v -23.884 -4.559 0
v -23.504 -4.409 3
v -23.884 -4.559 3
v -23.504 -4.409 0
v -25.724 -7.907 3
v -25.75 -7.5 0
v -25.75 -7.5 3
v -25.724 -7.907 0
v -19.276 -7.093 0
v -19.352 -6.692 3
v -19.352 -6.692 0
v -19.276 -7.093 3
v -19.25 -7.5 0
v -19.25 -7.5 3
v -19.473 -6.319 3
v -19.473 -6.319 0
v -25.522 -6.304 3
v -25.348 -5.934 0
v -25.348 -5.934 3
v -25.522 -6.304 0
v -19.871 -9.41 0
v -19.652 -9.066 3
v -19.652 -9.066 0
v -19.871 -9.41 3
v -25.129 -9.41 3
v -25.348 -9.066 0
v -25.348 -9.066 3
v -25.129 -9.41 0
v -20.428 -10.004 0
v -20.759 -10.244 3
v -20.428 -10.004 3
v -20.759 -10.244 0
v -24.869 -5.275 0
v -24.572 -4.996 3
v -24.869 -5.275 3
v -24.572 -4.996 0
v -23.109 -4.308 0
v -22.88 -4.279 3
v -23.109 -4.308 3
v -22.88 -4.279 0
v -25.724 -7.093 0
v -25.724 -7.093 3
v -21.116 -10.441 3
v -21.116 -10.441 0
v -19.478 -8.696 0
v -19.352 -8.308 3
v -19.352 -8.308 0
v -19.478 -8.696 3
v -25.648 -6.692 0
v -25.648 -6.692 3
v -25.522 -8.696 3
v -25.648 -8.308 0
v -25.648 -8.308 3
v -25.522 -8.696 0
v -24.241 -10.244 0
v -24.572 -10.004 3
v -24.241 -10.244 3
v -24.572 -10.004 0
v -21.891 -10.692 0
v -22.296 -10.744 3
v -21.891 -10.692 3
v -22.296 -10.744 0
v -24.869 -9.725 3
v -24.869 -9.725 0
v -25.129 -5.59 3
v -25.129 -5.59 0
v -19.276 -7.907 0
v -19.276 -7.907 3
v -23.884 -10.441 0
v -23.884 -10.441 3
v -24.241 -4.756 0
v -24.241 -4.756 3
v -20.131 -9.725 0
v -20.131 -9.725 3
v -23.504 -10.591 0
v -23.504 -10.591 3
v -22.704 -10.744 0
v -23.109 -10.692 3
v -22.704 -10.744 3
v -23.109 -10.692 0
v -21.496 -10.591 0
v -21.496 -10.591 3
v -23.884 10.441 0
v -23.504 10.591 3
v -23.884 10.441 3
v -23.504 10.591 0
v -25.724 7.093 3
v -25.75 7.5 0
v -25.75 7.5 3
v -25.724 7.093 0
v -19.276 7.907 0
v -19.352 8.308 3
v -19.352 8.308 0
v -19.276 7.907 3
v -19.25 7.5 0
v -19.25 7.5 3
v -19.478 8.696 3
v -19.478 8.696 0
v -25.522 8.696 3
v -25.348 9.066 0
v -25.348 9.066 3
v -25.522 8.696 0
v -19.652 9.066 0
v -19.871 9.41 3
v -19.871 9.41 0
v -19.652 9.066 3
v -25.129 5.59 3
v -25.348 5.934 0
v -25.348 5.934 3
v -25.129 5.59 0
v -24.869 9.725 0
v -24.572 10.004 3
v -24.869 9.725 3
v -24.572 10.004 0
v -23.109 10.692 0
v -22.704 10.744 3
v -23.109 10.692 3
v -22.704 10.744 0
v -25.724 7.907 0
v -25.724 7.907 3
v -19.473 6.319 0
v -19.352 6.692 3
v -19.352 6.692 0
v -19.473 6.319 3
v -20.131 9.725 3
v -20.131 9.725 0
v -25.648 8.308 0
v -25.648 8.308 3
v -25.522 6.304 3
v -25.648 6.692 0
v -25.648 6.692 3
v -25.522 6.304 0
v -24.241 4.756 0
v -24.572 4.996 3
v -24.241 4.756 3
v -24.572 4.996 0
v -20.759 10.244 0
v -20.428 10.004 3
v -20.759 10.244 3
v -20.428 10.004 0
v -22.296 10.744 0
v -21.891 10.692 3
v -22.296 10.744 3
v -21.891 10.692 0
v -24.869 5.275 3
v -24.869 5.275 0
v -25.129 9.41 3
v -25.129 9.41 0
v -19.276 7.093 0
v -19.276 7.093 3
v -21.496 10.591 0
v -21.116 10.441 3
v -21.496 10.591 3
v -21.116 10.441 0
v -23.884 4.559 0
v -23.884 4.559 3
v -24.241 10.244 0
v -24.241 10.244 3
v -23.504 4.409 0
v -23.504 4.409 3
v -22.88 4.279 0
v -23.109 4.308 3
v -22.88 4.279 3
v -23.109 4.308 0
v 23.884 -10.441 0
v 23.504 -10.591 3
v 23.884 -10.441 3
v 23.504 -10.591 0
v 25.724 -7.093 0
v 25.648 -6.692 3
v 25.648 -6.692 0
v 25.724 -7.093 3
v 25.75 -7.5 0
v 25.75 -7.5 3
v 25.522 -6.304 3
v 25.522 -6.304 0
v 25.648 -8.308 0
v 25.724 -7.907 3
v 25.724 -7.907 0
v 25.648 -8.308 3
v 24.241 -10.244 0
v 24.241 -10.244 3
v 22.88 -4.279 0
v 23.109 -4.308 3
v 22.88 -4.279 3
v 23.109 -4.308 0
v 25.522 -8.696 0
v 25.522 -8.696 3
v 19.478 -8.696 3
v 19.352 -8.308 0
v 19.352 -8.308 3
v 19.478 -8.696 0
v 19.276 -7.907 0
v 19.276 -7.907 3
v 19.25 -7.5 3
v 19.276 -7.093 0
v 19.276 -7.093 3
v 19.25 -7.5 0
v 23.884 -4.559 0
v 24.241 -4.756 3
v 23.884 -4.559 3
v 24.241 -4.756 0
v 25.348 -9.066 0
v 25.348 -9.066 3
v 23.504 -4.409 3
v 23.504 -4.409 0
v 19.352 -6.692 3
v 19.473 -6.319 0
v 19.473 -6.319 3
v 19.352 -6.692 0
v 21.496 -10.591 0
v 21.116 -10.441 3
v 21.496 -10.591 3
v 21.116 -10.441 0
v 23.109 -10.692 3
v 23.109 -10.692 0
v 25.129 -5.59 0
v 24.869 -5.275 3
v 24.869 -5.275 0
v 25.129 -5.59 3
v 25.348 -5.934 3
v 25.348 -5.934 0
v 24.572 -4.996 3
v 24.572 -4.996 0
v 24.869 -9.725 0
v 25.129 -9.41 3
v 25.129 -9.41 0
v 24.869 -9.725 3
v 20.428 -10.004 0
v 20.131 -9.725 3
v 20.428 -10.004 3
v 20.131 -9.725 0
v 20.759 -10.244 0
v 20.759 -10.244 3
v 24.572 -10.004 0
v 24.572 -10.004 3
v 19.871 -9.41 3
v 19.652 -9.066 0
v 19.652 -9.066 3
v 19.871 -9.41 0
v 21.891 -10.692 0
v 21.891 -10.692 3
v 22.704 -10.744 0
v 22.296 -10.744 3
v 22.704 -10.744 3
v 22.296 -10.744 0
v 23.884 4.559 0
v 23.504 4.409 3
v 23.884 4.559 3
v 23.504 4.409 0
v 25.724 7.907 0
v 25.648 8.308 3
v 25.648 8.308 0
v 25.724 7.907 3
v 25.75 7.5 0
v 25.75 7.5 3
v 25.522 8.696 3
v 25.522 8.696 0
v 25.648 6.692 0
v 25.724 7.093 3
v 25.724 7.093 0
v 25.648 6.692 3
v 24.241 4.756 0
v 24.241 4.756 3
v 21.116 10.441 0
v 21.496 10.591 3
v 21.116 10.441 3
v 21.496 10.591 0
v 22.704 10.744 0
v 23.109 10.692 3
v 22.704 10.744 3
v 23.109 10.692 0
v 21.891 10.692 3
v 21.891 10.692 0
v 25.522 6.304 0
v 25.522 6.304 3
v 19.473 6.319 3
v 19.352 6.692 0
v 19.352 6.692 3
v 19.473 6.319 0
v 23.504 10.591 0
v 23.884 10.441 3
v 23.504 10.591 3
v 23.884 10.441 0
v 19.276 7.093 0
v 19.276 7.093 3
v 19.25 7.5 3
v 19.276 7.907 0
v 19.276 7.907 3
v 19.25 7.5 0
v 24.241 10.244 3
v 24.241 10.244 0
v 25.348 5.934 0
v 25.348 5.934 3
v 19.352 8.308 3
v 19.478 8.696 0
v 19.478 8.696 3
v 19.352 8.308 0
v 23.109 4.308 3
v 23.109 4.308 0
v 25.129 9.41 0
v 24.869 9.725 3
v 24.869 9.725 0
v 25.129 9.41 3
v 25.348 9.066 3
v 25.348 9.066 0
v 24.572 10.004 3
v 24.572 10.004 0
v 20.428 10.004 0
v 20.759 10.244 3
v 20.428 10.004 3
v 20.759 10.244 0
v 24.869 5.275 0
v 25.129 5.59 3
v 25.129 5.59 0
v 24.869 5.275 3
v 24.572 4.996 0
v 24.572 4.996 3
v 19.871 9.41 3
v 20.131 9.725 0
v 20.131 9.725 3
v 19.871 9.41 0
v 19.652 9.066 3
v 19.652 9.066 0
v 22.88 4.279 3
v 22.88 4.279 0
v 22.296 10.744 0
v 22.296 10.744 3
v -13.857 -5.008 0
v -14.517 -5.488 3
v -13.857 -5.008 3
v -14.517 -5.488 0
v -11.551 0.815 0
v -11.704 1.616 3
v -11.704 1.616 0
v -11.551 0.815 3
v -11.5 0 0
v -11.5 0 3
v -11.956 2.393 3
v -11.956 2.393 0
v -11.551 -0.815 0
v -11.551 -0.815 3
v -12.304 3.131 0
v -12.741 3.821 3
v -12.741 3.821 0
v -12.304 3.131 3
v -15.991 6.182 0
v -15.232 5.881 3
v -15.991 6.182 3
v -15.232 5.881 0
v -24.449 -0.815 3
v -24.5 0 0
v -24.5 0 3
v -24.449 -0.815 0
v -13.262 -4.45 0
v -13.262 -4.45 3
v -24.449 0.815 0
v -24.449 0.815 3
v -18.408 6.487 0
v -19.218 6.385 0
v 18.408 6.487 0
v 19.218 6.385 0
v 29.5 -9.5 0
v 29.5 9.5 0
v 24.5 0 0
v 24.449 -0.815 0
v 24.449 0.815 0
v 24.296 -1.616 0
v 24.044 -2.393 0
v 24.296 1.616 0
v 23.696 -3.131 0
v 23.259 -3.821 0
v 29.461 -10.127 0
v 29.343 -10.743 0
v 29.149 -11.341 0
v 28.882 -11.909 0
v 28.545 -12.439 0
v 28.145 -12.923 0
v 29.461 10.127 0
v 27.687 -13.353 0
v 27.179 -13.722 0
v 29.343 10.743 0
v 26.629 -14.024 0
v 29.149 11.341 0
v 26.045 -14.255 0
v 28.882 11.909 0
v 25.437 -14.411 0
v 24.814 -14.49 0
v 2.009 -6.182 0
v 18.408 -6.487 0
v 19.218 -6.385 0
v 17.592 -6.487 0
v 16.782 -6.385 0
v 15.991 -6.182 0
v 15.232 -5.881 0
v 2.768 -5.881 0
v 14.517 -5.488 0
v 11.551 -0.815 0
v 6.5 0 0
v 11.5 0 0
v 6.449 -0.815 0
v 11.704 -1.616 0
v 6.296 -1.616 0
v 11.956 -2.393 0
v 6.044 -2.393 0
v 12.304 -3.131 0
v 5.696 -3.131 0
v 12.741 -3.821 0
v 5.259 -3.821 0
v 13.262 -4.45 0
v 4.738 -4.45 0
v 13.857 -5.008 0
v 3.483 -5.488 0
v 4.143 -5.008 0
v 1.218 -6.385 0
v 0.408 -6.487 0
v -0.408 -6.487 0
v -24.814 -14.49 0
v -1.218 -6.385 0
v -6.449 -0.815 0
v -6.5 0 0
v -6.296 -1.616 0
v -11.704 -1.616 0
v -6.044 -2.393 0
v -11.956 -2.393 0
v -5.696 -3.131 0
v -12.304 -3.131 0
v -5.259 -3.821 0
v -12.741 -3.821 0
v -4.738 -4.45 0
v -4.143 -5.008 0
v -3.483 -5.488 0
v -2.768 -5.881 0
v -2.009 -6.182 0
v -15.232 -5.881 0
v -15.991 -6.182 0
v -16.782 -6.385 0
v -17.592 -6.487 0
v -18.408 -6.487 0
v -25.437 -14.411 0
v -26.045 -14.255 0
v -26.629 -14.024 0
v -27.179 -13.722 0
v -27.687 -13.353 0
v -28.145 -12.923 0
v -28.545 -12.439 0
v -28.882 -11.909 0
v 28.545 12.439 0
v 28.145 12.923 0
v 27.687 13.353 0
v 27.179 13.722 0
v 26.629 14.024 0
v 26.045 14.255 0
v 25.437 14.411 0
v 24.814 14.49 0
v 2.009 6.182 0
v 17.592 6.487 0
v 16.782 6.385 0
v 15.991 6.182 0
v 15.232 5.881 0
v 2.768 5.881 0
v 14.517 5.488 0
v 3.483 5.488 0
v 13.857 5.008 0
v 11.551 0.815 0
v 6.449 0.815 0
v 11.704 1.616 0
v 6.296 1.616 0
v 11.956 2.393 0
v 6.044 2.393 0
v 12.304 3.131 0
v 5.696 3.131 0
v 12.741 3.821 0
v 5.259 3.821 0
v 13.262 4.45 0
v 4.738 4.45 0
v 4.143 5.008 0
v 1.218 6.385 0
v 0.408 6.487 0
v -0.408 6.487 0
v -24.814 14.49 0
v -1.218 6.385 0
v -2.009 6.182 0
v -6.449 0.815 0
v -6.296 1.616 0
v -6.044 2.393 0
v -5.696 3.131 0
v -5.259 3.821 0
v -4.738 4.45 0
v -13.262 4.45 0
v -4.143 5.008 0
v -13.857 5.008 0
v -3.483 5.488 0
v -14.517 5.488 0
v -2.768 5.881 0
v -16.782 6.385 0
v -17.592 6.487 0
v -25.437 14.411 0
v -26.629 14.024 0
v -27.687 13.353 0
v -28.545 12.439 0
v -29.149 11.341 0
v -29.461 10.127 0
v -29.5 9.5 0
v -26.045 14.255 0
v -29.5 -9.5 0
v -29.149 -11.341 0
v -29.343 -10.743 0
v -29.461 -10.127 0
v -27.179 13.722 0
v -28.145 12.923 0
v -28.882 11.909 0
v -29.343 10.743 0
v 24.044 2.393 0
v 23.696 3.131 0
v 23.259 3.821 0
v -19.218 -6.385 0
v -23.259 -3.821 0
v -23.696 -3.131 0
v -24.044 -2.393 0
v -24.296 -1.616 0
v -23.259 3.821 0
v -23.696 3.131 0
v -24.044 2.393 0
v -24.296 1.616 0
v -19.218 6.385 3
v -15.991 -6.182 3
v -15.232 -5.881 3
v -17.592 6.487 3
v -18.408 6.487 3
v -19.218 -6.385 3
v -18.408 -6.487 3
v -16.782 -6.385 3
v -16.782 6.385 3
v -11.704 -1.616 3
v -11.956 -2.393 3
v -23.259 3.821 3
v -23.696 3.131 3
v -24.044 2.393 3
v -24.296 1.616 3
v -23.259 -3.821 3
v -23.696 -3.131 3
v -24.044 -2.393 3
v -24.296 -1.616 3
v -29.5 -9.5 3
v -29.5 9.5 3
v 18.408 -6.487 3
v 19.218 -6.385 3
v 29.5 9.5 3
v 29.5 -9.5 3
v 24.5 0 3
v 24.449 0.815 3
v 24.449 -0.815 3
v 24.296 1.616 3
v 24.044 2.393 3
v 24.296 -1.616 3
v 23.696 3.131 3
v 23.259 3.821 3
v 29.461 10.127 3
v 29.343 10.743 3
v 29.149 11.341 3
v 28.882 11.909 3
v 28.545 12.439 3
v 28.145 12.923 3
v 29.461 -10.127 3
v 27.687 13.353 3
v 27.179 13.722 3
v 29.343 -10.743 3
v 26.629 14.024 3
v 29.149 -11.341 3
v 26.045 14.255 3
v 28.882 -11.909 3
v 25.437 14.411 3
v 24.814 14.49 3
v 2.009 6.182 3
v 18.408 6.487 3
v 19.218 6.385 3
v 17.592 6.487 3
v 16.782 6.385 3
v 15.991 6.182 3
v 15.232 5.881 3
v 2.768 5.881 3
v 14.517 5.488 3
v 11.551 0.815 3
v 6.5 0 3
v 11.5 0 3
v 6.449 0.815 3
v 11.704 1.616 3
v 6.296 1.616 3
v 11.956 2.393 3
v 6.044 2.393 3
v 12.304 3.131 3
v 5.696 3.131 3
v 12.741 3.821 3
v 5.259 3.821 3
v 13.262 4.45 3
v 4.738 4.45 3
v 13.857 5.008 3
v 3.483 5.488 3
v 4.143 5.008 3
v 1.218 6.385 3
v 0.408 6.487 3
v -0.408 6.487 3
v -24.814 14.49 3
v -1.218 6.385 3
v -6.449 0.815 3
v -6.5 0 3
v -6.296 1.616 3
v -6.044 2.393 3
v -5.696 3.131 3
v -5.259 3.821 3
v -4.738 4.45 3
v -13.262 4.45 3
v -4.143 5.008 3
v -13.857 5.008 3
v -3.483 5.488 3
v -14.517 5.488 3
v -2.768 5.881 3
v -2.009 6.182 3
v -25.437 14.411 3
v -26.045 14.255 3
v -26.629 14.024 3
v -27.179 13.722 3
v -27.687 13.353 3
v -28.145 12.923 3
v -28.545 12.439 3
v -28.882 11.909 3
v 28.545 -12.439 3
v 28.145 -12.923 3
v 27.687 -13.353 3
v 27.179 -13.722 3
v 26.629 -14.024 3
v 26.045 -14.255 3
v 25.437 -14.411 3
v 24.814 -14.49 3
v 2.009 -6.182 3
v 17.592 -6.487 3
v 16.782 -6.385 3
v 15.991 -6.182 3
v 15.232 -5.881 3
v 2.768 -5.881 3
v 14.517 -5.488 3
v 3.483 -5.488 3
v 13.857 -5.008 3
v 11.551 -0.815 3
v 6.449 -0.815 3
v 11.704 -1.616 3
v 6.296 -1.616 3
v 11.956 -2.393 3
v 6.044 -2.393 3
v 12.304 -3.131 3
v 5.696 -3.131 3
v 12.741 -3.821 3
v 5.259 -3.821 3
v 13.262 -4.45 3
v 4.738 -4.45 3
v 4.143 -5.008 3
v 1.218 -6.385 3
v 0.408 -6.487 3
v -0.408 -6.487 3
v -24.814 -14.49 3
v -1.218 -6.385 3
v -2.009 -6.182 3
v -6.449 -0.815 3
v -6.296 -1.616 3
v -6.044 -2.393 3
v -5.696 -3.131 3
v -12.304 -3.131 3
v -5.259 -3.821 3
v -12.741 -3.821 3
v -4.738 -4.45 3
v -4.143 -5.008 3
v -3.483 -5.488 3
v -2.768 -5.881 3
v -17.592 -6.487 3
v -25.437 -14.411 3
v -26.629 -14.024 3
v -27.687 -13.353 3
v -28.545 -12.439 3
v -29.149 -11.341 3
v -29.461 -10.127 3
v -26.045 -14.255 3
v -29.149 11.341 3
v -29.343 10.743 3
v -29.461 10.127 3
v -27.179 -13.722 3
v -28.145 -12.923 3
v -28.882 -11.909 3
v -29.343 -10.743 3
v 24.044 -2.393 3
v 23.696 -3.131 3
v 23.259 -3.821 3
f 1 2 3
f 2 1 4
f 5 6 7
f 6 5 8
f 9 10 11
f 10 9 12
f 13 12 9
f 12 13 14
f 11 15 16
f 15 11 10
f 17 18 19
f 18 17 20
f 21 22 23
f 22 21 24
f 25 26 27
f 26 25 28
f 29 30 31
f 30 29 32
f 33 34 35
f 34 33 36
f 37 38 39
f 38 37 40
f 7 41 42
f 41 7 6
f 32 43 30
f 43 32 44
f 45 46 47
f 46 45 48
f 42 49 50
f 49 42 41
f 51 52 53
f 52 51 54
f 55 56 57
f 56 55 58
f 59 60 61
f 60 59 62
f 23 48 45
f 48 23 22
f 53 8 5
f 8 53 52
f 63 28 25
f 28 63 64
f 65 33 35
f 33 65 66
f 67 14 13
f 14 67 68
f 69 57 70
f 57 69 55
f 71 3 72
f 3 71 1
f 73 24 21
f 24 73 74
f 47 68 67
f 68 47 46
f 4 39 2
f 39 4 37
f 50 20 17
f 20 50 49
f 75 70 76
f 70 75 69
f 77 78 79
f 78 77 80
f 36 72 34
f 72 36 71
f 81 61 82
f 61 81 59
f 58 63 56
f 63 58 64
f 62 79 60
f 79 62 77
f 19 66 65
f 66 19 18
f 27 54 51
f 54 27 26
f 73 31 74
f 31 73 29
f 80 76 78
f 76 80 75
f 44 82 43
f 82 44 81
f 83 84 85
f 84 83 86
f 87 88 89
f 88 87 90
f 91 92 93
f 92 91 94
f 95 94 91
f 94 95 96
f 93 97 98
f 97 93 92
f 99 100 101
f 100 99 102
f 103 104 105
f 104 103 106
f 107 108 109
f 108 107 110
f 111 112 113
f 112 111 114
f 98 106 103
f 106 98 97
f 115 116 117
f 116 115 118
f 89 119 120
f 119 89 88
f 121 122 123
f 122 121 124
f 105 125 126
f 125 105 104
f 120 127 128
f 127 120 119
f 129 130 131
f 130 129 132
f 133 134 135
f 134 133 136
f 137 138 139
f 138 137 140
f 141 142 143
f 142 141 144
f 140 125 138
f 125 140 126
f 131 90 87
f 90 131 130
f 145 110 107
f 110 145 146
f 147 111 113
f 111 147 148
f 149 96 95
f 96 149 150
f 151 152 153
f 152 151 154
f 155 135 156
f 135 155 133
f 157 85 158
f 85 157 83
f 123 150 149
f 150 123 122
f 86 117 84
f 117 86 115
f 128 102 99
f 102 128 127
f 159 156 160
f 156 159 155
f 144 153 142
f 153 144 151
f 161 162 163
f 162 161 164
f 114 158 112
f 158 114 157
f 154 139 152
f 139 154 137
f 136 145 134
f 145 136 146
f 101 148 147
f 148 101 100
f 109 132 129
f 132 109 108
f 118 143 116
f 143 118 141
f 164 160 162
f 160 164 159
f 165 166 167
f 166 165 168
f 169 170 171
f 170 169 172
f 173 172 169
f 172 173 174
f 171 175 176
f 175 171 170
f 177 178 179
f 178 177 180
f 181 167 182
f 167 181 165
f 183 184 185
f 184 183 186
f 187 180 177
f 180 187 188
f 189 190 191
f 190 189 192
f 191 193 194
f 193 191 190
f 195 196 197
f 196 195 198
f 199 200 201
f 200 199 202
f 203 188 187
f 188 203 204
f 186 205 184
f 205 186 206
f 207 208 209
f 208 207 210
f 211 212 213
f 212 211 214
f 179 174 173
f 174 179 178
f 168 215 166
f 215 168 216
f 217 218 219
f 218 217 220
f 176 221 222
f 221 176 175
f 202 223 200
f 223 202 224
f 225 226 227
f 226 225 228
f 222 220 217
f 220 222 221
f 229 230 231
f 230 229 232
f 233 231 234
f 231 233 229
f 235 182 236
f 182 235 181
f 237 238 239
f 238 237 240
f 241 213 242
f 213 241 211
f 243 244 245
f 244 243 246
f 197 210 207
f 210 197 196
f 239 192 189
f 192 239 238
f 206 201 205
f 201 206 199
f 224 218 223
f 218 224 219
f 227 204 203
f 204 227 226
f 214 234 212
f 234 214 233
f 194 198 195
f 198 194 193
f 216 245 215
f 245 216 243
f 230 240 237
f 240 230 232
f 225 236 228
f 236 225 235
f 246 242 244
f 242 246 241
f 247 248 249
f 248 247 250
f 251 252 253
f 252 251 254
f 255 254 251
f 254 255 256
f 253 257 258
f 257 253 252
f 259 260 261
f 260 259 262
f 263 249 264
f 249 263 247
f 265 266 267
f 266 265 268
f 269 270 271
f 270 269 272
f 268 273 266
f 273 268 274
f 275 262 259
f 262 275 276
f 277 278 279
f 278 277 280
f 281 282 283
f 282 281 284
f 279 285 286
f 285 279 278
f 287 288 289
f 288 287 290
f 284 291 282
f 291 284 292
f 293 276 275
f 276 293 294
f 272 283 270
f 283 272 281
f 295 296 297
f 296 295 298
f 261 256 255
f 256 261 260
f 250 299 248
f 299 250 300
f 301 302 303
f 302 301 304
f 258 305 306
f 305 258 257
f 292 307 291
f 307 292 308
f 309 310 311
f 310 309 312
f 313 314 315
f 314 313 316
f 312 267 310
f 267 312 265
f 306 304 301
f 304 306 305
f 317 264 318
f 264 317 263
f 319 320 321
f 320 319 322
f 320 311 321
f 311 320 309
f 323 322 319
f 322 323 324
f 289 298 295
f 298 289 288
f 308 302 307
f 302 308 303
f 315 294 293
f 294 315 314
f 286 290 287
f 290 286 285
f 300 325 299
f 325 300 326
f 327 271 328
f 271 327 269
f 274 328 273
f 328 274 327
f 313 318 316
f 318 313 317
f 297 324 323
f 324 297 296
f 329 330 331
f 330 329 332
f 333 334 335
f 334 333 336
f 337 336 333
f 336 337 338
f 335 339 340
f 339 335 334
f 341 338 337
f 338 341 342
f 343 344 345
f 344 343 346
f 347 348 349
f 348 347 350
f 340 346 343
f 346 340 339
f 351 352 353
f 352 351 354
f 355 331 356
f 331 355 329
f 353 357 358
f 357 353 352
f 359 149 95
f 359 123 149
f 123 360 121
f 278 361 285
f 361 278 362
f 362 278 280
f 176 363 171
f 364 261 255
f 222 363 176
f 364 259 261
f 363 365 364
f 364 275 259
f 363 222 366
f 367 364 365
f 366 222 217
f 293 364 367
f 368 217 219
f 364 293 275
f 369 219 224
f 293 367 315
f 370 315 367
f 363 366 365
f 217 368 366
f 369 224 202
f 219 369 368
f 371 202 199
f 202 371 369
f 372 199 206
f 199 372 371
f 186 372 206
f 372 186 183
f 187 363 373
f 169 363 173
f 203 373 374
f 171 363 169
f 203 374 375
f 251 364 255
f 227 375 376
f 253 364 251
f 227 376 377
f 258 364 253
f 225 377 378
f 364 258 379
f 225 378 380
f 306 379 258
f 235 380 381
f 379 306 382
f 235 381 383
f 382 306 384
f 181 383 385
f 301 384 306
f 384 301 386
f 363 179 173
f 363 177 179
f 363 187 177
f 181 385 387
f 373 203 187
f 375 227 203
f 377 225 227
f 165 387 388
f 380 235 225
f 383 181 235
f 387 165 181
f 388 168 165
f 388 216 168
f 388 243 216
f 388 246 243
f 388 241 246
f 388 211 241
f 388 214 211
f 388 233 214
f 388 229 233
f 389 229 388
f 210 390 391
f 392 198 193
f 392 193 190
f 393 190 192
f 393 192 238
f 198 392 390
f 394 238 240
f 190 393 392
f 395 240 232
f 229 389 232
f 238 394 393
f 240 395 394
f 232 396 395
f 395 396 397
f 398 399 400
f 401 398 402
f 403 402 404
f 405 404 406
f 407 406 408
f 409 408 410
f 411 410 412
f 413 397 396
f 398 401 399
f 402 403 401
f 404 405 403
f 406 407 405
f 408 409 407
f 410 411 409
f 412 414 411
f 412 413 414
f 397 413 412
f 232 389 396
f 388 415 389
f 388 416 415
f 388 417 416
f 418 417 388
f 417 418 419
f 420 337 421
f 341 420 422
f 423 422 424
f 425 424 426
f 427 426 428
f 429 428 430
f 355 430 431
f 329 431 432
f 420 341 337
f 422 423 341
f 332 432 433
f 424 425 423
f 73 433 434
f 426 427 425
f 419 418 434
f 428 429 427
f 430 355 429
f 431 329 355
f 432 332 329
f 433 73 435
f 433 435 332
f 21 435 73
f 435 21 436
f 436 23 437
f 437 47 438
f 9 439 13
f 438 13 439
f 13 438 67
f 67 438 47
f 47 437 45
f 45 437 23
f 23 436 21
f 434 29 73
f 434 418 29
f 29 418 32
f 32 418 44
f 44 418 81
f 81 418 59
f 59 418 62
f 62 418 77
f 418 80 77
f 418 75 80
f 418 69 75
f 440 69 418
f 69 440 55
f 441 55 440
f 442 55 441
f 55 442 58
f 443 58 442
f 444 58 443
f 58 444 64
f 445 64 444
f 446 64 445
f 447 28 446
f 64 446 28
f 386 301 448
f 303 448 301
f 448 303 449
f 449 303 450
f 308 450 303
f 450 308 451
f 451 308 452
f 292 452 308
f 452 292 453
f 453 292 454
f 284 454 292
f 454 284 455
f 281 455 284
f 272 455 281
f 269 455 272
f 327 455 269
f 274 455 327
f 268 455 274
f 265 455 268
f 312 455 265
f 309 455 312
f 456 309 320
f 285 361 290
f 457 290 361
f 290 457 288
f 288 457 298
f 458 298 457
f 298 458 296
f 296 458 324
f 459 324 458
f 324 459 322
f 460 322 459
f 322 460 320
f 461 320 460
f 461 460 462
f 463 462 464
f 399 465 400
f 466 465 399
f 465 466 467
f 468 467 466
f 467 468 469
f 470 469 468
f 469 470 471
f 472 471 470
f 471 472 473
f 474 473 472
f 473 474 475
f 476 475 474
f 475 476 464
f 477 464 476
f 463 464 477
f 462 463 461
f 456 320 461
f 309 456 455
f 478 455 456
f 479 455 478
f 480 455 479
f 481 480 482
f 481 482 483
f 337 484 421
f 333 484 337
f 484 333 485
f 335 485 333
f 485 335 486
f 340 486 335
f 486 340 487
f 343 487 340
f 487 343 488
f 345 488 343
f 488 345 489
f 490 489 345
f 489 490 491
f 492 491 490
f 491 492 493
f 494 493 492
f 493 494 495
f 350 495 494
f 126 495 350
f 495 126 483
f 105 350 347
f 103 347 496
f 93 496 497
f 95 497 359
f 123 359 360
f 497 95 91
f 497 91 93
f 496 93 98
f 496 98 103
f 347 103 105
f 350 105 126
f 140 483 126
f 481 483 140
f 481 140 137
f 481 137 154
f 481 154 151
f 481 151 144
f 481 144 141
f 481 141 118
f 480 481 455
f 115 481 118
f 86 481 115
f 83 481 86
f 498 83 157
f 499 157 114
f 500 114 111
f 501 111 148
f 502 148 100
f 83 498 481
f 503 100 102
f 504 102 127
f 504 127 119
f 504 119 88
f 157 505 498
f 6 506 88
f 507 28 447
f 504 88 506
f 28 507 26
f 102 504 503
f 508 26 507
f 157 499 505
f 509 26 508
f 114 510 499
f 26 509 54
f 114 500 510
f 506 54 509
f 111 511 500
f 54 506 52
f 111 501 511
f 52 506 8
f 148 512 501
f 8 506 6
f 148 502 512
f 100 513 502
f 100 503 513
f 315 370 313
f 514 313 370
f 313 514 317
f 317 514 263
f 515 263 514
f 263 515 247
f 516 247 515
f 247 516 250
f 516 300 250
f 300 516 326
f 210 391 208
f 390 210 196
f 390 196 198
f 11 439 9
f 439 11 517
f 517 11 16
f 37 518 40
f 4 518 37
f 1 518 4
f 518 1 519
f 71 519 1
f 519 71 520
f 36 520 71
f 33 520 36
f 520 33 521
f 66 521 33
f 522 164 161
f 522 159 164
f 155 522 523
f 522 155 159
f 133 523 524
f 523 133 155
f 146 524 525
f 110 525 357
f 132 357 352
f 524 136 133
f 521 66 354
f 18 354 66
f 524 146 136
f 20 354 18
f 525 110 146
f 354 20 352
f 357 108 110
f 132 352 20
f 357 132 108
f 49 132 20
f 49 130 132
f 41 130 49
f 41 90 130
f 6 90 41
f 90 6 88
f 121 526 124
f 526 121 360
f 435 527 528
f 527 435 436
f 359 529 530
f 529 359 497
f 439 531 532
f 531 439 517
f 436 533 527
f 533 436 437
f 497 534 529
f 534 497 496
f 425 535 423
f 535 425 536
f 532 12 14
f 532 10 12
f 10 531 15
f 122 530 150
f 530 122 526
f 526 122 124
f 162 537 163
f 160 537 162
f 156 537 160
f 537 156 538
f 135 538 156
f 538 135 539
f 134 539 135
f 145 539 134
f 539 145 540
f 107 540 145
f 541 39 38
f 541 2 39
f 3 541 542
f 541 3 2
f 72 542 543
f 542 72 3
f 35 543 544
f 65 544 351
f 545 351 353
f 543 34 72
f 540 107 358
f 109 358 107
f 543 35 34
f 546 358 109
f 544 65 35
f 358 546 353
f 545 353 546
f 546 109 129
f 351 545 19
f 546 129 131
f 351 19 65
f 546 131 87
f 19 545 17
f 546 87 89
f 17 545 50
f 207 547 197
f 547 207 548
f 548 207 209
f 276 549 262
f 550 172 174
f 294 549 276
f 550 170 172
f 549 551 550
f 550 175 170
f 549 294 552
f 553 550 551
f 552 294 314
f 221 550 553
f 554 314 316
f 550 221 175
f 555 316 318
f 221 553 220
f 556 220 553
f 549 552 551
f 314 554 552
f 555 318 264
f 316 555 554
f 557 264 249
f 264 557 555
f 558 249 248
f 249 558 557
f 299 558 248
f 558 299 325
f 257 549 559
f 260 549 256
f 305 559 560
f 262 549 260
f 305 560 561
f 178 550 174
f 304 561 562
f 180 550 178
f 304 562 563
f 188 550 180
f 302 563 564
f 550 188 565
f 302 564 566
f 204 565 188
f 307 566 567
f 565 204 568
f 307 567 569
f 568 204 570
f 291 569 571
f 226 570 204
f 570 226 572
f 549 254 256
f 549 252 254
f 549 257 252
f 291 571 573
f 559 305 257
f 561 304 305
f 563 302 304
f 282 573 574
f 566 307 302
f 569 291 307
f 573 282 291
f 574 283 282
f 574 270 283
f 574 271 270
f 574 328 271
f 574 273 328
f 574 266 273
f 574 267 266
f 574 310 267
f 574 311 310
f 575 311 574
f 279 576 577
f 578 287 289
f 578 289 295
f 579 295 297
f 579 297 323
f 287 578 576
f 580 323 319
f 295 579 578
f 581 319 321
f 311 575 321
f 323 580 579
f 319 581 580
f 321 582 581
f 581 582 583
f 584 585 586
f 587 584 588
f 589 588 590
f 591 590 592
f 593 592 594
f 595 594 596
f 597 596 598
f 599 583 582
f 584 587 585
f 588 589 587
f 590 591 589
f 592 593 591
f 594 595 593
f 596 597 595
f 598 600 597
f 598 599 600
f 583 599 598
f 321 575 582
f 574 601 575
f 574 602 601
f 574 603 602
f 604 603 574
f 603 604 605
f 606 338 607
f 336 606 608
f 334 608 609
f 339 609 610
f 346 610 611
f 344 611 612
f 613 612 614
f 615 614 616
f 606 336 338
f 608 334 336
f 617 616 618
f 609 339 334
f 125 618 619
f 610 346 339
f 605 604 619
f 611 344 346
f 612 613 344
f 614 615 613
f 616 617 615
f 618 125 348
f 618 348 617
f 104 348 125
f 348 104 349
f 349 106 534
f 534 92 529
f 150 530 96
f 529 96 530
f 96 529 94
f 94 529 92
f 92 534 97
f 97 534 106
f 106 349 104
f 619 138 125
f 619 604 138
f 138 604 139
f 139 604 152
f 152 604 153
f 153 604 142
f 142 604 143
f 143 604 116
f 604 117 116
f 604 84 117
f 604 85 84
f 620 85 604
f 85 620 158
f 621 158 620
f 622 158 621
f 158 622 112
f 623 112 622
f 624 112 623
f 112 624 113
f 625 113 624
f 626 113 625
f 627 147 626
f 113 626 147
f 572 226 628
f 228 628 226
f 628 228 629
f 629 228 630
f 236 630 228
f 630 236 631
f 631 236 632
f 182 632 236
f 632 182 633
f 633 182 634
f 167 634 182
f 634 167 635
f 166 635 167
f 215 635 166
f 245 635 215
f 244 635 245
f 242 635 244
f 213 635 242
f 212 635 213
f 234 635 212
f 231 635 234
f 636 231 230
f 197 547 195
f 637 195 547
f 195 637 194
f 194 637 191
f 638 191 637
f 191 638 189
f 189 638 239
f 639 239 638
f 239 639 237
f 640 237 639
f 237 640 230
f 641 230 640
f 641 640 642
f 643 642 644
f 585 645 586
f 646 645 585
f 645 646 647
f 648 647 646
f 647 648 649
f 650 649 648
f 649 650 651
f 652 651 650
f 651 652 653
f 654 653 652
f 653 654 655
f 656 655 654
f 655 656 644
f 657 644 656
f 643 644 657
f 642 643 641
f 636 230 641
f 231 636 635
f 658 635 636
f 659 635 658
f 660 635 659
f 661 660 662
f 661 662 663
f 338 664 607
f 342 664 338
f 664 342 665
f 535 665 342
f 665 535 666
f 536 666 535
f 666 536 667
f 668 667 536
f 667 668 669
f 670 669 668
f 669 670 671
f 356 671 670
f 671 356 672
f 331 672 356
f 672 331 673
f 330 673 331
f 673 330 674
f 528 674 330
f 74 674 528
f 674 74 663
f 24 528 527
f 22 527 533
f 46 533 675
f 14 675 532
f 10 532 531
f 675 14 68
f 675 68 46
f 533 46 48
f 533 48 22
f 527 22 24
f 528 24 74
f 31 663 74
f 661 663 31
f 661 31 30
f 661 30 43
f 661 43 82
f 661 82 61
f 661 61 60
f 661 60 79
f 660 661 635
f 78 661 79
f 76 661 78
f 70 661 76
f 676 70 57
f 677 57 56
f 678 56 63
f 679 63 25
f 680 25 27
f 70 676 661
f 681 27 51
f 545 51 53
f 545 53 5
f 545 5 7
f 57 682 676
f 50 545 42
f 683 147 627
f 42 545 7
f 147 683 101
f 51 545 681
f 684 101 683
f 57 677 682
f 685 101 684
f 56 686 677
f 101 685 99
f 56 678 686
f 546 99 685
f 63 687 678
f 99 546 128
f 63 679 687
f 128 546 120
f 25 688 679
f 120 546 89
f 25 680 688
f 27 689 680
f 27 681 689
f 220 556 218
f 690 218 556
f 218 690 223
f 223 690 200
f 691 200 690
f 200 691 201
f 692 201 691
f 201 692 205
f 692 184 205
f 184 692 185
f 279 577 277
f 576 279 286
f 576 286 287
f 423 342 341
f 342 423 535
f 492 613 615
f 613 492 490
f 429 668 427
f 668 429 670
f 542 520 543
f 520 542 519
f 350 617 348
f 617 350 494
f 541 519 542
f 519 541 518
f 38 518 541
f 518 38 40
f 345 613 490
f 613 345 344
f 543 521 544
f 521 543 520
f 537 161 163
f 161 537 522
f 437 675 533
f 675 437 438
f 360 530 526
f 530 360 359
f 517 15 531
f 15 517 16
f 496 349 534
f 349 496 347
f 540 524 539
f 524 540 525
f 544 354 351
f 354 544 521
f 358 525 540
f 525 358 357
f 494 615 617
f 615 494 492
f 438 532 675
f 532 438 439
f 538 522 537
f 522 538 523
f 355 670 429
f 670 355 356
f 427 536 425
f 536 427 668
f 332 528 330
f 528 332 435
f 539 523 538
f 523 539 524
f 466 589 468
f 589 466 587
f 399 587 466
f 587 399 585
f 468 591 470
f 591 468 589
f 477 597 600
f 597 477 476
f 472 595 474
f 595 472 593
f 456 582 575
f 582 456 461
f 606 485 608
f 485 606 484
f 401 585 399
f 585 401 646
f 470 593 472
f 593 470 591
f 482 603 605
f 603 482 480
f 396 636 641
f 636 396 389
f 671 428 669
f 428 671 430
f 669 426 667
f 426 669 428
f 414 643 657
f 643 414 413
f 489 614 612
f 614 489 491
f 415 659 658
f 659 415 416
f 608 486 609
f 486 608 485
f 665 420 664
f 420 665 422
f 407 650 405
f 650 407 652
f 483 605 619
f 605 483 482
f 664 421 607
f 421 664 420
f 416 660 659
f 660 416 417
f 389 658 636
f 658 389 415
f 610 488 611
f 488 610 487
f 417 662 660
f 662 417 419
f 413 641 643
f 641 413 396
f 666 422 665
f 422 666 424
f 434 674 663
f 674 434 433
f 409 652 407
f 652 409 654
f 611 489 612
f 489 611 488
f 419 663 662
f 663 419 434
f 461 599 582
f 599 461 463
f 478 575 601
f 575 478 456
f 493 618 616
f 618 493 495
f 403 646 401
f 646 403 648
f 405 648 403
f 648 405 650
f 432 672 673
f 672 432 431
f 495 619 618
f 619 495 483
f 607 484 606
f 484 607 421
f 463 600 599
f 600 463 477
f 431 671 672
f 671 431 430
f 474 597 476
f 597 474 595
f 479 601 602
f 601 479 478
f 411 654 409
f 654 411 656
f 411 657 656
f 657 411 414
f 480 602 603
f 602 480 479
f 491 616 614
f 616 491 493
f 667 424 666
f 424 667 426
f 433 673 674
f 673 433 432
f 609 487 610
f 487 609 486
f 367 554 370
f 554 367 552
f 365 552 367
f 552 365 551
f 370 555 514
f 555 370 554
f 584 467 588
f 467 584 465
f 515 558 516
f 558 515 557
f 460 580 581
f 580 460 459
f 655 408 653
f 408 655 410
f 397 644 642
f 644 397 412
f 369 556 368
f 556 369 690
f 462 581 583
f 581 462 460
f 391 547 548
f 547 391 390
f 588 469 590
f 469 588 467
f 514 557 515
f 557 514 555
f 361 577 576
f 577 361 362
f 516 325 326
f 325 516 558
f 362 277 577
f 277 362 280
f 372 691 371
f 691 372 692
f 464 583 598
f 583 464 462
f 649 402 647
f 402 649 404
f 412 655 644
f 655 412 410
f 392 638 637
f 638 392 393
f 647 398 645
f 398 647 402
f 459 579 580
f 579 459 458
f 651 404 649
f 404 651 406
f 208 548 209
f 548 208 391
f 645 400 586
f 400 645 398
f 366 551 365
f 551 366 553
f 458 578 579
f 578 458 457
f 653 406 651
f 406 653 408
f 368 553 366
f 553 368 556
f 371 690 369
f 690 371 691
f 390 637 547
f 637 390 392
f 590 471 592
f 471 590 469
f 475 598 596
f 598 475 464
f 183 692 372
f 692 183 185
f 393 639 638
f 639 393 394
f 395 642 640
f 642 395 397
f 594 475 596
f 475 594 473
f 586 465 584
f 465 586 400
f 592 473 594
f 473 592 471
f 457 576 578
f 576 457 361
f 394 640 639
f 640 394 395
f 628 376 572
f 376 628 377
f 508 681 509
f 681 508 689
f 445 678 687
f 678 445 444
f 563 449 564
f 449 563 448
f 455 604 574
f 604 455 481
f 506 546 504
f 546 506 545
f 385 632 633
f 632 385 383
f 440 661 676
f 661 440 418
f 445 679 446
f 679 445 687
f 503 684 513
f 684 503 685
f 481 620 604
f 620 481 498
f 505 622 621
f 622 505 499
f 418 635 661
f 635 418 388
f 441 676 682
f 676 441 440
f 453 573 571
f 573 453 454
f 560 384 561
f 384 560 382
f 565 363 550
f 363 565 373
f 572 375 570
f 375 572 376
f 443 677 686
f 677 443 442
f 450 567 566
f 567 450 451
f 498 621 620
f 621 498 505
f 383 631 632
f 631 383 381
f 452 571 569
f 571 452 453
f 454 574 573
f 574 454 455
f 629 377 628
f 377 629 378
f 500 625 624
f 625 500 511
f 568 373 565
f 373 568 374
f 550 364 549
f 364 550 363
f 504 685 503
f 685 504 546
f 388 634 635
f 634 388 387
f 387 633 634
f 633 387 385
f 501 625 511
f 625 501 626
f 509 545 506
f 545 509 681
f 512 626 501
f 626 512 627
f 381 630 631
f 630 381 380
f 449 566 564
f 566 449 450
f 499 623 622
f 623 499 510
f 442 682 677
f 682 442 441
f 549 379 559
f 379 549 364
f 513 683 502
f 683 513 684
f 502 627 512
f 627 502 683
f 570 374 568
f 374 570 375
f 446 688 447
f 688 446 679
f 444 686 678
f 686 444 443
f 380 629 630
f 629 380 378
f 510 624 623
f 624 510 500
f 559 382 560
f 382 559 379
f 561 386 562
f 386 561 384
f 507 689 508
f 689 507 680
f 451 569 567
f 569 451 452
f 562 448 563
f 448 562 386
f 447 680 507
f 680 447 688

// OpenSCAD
$fn = 50;


difference() {
	union() {
		hull() {
			translate(v = [-24.5000000000, 9.5000000000, 0]) {
				cylinder(h = 3, r = 5);
			}
			translate(v = [24.5000000000, 9.5000000000, 0]) {
				cylinder(h = 3, r = 5);
			}
			translate(v = [-24.5000000000, -9.5000000000, 0]) {
				cylinder(h = 3, r = 5);
			}
			translate(v = [24.5000000000, -9.5000000000, 0]) {
				cylinder(h = 3, r = 5);
			}
		}
	}
	union() {
		#translate(v = [-22.5000000000, -7.5000000000, -100.0000000000]) {
			cylinder(h = 200, r = 3.2500000000);
		}
		#translate(v = [-22.5000000000, 7.5000000000, -100.0000000000]) {
			cylinder(h = 200, r = 3.2500000000);
		}
		#translate(v = [22.5000000000, -7.5000000000, -100.0000000000]) {
			cylinder(h = 200, r = 3.2500000000);
		}
		#translate(v = [22.5000000000, 7.5000000000, -100.0000000000]) {
			cylinder(h = 200, r = 3.2500000000);
		}
		#translate(v = [-18.0000000000, 0, 0]) {
			cylinder(h = 3, r = 6.5000000000);
		}
		#cylinder(h = 3, r = 6.5000000000);
		#translate(v = [18.0000000000, 0, 0]) {
			cylinder(h = 3, r = 6.5000000000);
		}
	}
}
